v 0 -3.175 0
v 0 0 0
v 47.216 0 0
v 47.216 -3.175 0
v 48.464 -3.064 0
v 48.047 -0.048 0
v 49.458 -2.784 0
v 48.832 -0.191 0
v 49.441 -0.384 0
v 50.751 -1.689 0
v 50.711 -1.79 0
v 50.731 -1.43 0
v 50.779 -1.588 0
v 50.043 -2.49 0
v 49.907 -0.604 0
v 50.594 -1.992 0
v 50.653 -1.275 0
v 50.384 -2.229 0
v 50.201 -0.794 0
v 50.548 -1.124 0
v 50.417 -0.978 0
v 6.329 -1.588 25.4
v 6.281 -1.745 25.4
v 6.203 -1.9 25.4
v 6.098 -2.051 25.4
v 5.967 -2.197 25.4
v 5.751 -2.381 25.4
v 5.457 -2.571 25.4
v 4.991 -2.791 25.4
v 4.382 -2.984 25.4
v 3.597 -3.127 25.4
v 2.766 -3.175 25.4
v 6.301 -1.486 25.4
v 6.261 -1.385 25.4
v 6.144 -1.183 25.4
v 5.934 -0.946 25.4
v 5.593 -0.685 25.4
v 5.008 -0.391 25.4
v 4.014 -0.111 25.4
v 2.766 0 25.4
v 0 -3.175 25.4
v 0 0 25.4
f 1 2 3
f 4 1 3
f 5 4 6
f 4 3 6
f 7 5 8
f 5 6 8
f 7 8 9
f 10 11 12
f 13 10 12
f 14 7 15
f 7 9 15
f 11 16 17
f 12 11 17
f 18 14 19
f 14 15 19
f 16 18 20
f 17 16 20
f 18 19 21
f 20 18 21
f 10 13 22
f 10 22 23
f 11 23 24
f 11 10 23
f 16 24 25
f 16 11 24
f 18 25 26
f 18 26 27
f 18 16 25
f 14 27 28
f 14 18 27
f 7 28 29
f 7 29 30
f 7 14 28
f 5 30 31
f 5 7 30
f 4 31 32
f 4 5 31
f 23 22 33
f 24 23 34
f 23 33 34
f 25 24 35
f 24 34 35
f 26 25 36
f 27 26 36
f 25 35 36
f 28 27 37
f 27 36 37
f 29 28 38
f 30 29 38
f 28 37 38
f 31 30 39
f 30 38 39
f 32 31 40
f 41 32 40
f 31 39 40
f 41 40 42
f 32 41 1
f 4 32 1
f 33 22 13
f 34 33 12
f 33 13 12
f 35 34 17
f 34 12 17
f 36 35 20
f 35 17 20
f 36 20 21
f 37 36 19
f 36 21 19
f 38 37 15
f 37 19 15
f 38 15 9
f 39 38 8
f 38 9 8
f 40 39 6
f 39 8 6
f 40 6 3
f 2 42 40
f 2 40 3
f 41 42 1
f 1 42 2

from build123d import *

# Parameters (mm, degrees)
F1_DEPTH    = 3.175
F2_T1_DEPTH = 60.0853367017


# Not quite as in the source:
# - a fillet or chamfer that OpenCascade refuses, or shapes differently, is made with other operations: its cross-section is extruded or revolved along the edge and cut away or added


with BuildPart() as f1:
    # F0 (on Front) → F1 (new body)
    with BuildSketch(Plane.XZ):
        Polygon((0, 25.4), (0, 0), (50.8, 0), (6.35, 25.4), align=None)
    extrude(amount=F1_DEPTH)

    # F2: fillet of radius 1.778 on 2 edges, made by hand

    # F2_s2 → F2_t1 (cut)
    with BuildSketch(Plane(origin=(42.1547253821, 0, -24.0884145041), x_dir=(0, 1, 0), z_dir=(-0.8682431421, 0, 0.4961389384))):
        with BuildLine():
            ThreePointArc((-1.397, -25.2038580685), (-2.6542358569, -24.6830939255), (-3.175, -23.4258580685))
            Line((-3.175, -23.4258580685), (-3.175, -25.2038580685))
            Line((-3.175, -25.2038580685), (-1.397, -25.2038580685))
        make_face()
        with BuildLine():
            ThreePointArc((-1.778, -25.2038580685), (-0.5207641431, -24.6830939255), (0, -23.4258580685))
            Line((0, -23.4258580685), (0, -25.2038580685))
            Line((0, -25.2038580685), (-1.778, -25.2038580685))
        make_face()
    extrude(amount=F2_T1_DEPTH, mode=Mode.SUBTRACT)


solid = f1.part
